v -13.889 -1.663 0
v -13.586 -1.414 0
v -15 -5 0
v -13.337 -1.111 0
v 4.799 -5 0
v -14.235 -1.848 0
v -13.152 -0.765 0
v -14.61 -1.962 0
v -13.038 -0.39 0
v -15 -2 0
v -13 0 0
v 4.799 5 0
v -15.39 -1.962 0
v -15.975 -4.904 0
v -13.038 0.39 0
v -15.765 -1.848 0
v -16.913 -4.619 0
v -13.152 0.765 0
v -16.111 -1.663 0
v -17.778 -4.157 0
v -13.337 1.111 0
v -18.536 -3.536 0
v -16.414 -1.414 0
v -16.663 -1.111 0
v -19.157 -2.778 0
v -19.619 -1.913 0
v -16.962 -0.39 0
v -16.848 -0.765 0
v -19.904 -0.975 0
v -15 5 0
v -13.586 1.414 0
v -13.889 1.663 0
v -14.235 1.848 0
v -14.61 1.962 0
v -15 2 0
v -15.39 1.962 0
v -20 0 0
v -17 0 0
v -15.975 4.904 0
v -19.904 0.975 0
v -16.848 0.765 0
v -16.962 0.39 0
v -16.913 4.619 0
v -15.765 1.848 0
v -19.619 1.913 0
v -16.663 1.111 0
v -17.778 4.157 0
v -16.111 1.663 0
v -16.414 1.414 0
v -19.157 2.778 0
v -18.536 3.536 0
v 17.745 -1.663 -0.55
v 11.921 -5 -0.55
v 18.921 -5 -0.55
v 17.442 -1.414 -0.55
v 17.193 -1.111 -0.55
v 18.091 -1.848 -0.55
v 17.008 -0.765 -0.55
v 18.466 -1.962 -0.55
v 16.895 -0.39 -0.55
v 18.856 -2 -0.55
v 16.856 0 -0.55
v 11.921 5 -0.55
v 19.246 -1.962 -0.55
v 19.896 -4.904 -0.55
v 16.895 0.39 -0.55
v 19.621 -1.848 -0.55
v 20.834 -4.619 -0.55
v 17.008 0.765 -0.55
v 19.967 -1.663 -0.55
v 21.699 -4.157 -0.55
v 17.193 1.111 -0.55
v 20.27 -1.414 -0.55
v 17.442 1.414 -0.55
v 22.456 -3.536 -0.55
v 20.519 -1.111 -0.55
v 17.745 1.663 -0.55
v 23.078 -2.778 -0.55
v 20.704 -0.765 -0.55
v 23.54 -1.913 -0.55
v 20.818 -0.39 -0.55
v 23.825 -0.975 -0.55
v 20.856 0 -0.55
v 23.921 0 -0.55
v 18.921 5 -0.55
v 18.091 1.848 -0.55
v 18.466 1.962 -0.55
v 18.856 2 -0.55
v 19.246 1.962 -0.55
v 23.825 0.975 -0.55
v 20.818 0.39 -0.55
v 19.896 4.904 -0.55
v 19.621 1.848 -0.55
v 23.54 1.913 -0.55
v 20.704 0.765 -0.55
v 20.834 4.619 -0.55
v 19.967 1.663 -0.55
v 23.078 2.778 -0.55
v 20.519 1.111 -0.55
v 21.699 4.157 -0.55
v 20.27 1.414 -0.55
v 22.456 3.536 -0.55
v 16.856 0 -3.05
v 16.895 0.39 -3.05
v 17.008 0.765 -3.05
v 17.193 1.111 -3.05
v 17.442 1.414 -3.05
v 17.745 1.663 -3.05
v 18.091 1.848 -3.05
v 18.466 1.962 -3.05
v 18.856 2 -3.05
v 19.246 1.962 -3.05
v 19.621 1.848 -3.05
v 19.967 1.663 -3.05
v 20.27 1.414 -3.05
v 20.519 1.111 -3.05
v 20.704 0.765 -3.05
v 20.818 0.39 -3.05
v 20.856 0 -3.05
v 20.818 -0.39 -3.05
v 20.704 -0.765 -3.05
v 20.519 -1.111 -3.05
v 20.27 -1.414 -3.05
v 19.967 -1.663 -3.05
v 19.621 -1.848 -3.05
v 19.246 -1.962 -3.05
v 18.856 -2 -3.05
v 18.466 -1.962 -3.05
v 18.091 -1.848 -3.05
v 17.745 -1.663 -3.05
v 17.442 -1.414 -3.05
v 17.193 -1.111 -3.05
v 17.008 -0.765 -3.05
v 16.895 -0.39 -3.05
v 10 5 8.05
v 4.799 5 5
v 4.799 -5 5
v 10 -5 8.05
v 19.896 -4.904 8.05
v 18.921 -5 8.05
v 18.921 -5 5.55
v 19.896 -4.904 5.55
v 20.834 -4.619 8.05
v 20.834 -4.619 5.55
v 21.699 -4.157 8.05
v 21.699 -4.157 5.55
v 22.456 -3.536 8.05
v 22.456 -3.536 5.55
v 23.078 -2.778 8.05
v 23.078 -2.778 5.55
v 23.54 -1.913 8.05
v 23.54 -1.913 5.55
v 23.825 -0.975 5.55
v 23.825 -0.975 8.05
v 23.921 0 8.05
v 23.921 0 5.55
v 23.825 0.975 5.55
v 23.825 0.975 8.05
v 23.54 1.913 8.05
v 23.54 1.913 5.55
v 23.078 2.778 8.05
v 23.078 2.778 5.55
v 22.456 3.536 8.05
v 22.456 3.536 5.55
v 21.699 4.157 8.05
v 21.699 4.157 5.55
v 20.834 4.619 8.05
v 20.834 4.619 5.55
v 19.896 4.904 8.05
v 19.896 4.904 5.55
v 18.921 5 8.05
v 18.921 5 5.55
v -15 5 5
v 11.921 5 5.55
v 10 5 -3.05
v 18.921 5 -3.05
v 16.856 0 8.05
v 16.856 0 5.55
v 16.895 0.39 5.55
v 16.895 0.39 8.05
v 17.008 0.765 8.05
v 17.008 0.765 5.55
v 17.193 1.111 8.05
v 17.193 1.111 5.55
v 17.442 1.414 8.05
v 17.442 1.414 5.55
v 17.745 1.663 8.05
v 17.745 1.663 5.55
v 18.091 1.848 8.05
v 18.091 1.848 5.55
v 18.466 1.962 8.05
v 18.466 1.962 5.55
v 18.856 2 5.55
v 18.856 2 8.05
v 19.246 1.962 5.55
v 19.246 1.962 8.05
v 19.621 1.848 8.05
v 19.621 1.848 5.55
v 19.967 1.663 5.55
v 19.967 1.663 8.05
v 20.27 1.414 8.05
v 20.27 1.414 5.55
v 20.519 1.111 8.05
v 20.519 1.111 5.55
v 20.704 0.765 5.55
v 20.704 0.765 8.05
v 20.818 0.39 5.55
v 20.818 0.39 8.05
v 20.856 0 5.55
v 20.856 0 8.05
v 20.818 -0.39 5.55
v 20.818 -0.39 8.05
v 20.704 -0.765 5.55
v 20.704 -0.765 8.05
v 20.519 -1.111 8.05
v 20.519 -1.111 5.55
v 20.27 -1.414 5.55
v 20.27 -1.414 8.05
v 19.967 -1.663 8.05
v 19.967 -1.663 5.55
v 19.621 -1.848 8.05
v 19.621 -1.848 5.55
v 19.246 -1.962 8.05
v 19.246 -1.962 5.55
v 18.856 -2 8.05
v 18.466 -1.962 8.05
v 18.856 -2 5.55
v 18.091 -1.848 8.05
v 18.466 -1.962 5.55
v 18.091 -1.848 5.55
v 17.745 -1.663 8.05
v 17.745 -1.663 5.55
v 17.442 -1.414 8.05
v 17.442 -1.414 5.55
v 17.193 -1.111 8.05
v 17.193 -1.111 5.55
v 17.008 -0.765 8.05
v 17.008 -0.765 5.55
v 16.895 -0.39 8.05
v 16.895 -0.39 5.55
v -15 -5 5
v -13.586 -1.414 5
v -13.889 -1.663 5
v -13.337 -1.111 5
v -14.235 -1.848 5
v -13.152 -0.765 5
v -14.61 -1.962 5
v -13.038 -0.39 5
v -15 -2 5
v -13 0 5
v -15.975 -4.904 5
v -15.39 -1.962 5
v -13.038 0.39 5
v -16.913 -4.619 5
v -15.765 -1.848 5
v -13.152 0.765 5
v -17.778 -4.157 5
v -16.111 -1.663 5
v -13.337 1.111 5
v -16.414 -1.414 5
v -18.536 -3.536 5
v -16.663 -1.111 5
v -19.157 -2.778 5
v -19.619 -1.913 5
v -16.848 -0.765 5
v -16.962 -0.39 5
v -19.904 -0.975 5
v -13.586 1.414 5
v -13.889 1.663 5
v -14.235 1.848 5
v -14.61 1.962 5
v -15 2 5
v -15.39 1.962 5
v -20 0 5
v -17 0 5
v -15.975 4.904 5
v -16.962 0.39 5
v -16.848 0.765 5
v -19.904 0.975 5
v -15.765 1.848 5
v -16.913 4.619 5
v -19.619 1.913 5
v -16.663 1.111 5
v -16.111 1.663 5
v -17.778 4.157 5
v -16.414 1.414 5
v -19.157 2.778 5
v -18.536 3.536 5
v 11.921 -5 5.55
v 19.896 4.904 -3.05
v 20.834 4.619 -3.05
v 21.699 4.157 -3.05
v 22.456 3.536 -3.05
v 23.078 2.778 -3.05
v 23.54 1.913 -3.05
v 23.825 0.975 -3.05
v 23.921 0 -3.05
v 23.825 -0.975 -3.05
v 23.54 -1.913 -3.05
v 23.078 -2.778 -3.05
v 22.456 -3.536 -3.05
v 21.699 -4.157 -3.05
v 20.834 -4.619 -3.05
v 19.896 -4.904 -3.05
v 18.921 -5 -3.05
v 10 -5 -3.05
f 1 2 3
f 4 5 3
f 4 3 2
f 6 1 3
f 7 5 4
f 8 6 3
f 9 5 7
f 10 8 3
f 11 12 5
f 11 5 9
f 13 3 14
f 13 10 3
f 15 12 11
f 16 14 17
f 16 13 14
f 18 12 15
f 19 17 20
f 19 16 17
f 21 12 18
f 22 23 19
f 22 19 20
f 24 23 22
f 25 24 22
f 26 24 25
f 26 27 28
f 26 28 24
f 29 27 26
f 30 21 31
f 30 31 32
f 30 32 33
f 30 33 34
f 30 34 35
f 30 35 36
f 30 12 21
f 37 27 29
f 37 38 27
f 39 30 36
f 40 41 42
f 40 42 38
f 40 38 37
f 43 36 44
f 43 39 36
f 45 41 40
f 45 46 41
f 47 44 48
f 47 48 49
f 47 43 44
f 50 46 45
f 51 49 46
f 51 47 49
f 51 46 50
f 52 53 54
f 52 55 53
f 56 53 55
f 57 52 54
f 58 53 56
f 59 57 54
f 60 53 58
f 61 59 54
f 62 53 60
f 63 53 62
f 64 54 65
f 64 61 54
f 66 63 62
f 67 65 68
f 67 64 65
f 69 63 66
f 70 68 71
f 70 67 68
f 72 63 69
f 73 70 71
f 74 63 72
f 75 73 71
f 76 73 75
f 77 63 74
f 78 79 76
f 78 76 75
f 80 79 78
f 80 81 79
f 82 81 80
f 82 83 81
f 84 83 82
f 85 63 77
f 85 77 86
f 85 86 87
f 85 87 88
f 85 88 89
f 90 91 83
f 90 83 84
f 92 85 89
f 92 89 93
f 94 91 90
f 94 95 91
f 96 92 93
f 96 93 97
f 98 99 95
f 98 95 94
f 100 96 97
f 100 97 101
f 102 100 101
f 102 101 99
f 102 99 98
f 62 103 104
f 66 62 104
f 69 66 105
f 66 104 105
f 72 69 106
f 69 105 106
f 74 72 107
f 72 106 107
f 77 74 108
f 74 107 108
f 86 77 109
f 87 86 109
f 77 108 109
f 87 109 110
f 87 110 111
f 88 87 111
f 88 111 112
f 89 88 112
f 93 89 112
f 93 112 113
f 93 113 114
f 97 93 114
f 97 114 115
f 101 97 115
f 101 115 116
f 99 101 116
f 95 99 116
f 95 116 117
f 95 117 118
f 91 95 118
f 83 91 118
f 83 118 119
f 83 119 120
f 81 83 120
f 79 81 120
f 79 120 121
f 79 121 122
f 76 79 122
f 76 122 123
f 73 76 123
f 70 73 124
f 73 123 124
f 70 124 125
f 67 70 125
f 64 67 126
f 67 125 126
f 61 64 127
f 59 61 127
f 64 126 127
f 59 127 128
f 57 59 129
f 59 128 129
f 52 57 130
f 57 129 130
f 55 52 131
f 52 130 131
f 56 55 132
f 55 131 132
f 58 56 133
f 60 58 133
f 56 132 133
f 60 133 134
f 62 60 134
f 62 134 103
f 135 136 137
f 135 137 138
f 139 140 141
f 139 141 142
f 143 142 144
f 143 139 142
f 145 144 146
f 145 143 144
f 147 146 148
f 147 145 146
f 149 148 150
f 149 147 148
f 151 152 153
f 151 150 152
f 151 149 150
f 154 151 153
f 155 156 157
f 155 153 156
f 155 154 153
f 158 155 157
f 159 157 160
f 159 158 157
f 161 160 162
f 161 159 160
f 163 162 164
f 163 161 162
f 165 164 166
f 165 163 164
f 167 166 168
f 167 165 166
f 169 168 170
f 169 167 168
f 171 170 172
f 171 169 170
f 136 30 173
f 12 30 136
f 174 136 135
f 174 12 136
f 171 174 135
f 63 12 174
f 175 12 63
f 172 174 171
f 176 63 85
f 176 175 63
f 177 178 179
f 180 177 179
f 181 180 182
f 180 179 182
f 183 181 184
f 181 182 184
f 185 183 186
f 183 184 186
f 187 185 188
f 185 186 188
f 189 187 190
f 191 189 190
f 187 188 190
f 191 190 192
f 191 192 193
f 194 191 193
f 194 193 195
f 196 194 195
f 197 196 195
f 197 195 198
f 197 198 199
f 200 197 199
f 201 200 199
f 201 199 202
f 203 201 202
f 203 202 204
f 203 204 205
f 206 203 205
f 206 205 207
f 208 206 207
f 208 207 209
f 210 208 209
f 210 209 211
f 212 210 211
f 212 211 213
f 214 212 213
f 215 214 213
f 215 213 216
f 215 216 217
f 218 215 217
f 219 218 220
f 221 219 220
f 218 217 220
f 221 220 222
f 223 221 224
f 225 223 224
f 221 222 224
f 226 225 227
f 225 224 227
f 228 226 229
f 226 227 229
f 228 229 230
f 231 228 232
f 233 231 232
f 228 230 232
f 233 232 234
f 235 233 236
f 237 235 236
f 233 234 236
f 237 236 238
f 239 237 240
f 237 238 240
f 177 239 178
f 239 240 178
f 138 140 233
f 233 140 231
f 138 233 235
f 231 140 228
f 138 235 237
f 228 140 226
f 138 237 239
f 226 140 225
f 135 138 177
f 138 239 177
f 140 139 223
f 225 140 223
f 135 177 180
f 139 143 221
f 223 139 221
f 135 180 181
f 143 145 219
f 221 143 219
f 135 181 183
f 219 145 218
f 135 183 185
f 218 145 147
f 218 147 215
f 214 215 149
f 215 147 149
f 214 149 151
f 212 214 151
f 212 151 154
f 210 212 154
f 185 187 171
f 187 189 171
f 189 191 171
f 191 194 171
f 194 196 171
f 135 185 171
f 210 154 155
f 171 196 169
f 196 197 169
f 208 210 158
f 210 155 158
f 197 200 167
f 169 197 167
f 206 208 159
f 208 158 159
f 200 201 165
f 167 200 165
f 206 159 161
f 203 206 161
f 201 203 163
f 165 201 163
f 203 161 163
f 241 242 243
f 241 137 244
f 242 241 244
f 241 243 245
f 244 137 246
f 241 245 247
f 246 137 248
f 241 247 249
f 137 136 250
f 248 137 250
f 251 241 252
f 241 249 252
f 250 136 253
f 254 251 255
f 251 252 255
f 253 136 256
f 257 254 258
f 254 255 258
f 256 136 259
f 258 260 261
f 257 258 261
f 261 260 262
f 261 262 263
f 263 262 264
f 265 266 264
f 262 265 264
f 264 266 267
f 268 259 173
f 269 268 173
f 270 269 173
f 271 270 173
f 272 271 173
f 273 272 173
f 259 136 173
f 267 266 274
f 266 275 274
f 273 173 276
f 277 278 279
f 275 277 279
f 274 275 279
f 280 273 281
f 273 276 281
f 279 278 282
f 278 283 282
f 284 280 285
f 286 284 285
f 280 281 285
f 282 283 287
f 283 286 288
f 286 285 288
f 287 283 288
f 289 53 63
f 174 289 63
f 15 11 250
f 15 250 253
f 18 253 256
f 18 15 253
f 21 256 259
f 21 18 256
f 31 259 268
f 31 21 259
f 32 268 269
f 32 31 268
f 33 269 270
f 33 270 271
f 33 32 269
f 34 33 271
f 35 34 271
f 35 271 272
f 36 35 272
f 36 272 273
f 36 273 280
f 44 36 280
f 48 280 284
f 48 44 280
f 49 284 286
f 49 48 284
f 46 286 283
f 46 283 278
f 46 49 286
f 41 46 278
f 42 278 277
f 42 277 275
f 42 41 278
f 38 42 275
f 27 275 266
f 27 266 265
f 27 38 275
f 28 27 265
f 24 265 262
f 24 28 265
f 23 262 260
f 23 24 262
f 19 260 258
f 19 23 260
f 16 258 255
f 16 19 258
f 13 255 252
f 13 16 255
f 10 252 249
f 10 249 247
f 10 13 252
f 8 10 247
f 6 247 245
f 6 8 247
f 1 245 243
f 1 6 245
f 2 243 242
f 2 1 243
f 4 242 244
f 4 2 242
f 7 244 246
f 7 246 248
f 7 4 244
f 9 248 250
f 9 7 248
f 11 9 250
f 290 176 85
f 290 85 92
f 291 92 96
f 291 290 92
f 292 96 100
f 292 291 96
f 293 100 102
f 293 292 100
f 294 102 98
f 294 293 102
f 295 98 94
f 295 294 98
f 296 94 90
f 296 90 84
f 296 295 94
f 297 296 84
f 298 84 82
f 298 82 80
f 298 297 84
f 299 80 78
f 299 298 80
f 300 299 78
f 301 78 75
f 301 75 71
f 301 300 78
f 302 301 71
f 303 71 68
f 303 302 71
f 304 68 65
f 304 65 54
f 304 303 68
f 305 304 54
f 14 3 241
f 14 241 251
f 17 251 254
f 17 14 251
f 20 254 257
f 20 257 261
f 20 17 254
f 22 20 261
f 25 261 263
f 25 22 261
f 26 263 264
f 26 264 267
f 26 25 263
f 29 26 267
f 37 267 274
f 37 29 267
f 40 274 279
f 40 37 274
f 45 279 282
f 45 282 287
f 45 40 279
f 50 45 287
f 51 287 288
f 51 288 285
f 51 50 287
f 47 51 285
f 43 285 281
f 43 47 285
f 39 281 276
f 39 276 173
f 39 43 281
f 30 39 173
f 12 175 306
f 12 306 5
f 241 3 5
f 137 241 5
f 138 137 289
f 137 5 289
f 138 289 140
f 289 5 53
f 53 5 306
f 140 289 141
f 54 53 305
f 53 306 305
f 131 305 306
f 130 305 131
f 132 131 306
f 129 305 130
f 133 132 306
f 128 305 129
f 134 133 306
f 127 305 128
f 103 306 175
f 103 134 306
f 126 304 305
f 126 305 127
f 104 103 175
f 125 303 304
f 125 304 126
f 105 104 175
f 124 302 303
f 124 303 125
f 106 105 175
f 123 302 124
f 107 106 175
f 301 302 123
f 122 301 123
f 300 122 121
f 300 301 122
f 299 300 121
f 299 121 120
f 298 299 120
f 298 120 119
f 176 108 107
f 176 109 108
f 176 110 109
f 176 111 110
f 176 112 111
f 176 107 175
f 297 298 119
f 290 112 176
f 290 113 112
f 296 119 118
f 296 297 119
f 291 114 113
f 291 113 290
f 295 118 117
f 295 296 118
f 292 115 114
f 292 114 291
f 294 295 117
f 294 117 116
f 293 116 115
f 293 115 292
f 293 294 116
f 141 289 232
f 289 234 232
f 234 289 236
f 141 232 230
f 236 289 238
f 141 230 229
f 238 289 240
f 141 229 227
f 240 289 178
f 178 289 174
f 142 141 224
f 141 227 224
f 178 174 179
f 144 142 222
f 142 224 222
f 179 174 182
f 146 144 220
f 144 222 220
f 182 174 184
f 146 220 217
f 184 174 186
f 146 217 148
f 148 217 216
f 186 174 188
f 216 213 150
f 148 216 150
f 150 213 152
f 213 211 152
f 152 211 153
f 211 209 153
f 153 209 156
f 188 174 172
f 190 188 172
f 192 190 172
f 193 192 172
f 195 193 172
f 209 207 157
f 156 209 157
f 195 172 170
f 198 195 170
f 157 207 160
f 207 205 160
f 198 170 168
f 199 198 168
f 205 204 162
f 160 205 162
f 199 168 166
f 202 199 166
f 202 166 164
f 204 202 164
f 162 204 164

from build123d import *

# Parameters (mm, degrees)
ESQUISSE1_R             = 2
BOSS_EXTRU_1_DEPTH      = 5
ESQUISSE2_W             = 12
ESQUISSE2_H             = 2.5
BOSS_EXTRU_2_DEPTH      = 10
BOSS_EXTRU_2_2_DEPTH    = 10
ESQUISSE5_W             = 1.920676926
ESQUISSE5_H             = 10
BOSS_EXTRU_4_DEPTH      = 6.1
ESQUISSE7_W             = 2.5
ESQUISSE7_H             = 10
BOSS_EXTRU_6_DEPTH      = 1.920676926
CONG_4_RADIUS           = 5
CONG_4_LENGTH           = 2.5
BOSS_EXTRU_5_DEPTH      = 10
ESQUISSE4_R             = 2
ENL_V_MAT_EXTRU_2_DEPTH = 27.8404319
CONG_5_RADIUS           = 5
CONG_5_LENGTH           = 2.5


with BuildPart() as part:
    # Esquisse1 → Boss.-Extru.1 (new body)
    with BuildSketch(Plane.XY):
        with BuildLine():
            Line((-15, 5), (10, 5))
            Line((10, 5), (10, -5))
            Line((10, -5), (-15, -5))
            ThreePointArc((-15, -5), (-20, 0), (-15, 5))
        make_face()
        with Locations((-15, 0)):
            Circle(ESQUISSE1_R, mode=Mode.SUBTRACT)
    extrude(amount=BOSS_EXTRU_1_DEPTH)

    # Esquisse5 → Boss.-Extru.4 (add)
    with BuildSketch(Plane.XY.offset(-0.55)):
        with Locations((10.960338463, 0)):
            Rectangle(ESQUISSE5_W, ESQUISSE5_H)
    extrude(amount=BOSS_EXTRU_4_DEPTH)



with BuildPart() as body_2:
    # Esquisse2 → Boss.-Extru.2 (new, through all)
    with BuildSketch(Plane(origin=(0, 5, 0), x_dir=(1, 0, 0), z_dir=(0, 1, 0))):
        with Locations((17.920676926, 1.8)):
            Rectangle(ESQUISSE2_W, ESQUISSE2_H)
    extrude(amount=-BOSS_EXTRU_2_DEPTH)


with BuildPart() as body_3:
    # Esquisse2 → Boss.-Extru.2 2 (new, through all)
    with BuildSketch(Plane(origin=(0, 5, 0), x_dir=(1, 0, 0), z_dir=(0, 1, 0))):
        with Locations((17.920676926, -6.8)):
            Rectangle(ESQUISSE2_W, ESQUISSE2_H)
    extrude(amount=-BOSS_EXTRU_2_2_DEPTH)


with BuildPart() as part_1:
    add(part.part)

    add(body_2.part)  # Boss.-Extru.6 merges body 2

    add(body_3.part)  # Boss.-Extru.6 merges body 3
    # Esquisse7 → Boss.-Extru.6 (add)
    with BuildSketch(Plane.ZY.offset(-11.920676926)):
        with Locations((-1.8, 0)):
            Rectangle(ESQUISSE7_W, ESQUISSE7_H)
        with Locations((6.8, 0)):
            Rectangle(ESQUISSE7_W, ESQUISSE7_H)
    extrude(amount=BOSS_EXTRU_6_DEPTH)

    # Congé4: full round fillet: the end face becomes a half cylinder, R = half its width
    cong_4_face = Plane((23.920676926, 0, 6.8), x_dir=(0, 0, 1), z_dir=(1, 0, 0))  # on the end face: x along it, z out of the body
    cong_4_slab = cong_4_face.offset(-CONG_4_RADIUS / 2) * Box(CONG_4_LENGTH, 2 * CONG_4_RADIUS, CONG_4_RADIUS, mode=Mode.PRIVATE)  # the body's end, R deep
    cong_4_round = Plane((18.920676926, 0, 6.8), x_dir=(1, 0, 0), z_dir=(0, 0, 1)) * Cylinder(CONG_4_RADIUS, CONG_4_LENGTH, mode=Mode.PRIVATE)  # its axis R under the face
    add(cong_4_slab - cong_4_round, mode=Mode.SUBTRACT)

    # Esquisse6 → Boss.-Extru.5 (add, through all)
    with BuildSketch(Plane(origin=(0, 5, 0), x_dir=(1, 0, 0), z_dir=(0, 1, 0))):
        Polygon((10, 0), (10, 3.05), (4.799024164, 0), align=None)
        Polygon((4.799024164, -5), (10, -8.05), (10, -5), align=None)
    extrude(amount=-BOSS_EXTRU_5_DEPTH)

    # Esquisse4 → Enlèv. mat.-Extru.2 (cut, through all)
    with BuildSketch(Plane(origin=(0, 0, -3.05), x_dir=(-1, 0, 0), z_dir=(0, 0, -1))):
        with Locations((-18.856076392, 0)):
            Circle(ESQUISSE4_R)
    extrude(amount=-ENL_V_MAT_EXTRU_2_DEPTH, mode=Mode.SUBTRACT)

    # Congé5: full round fillet: the end face becomes a half cylinder, R = half its width
    cong_5_face = Plane((23.920676926, 0, -1.8), x_dir=(0, 0, -1), z_dir=(1, 0, 0))  # on the end face: x along it, z out of the body
    cong_5_slab = cong_5_face.offset(-CONG_5_RADIUS / 2) * Box(CONG_5_LENGTH, 2 * CONG_5_RADIUS, CONG_5_RADIUS, mode=Mode.PRIVATE)  # the body's end, R deep
    cong_5_round = Plane((18.920676926, 0, -1.8), x_dir=(1, 0, 0), z_dir=(0, 0, -1)) * Cylinder(CONG_5_RADIUS, CONG_5_LENGTH, mode=Mode.PRIVATE)  # its axis R under the face
    add(cong_5_slab - cong_5_round, mode=Mode.SUBTRACT)


solid = part_1.part
